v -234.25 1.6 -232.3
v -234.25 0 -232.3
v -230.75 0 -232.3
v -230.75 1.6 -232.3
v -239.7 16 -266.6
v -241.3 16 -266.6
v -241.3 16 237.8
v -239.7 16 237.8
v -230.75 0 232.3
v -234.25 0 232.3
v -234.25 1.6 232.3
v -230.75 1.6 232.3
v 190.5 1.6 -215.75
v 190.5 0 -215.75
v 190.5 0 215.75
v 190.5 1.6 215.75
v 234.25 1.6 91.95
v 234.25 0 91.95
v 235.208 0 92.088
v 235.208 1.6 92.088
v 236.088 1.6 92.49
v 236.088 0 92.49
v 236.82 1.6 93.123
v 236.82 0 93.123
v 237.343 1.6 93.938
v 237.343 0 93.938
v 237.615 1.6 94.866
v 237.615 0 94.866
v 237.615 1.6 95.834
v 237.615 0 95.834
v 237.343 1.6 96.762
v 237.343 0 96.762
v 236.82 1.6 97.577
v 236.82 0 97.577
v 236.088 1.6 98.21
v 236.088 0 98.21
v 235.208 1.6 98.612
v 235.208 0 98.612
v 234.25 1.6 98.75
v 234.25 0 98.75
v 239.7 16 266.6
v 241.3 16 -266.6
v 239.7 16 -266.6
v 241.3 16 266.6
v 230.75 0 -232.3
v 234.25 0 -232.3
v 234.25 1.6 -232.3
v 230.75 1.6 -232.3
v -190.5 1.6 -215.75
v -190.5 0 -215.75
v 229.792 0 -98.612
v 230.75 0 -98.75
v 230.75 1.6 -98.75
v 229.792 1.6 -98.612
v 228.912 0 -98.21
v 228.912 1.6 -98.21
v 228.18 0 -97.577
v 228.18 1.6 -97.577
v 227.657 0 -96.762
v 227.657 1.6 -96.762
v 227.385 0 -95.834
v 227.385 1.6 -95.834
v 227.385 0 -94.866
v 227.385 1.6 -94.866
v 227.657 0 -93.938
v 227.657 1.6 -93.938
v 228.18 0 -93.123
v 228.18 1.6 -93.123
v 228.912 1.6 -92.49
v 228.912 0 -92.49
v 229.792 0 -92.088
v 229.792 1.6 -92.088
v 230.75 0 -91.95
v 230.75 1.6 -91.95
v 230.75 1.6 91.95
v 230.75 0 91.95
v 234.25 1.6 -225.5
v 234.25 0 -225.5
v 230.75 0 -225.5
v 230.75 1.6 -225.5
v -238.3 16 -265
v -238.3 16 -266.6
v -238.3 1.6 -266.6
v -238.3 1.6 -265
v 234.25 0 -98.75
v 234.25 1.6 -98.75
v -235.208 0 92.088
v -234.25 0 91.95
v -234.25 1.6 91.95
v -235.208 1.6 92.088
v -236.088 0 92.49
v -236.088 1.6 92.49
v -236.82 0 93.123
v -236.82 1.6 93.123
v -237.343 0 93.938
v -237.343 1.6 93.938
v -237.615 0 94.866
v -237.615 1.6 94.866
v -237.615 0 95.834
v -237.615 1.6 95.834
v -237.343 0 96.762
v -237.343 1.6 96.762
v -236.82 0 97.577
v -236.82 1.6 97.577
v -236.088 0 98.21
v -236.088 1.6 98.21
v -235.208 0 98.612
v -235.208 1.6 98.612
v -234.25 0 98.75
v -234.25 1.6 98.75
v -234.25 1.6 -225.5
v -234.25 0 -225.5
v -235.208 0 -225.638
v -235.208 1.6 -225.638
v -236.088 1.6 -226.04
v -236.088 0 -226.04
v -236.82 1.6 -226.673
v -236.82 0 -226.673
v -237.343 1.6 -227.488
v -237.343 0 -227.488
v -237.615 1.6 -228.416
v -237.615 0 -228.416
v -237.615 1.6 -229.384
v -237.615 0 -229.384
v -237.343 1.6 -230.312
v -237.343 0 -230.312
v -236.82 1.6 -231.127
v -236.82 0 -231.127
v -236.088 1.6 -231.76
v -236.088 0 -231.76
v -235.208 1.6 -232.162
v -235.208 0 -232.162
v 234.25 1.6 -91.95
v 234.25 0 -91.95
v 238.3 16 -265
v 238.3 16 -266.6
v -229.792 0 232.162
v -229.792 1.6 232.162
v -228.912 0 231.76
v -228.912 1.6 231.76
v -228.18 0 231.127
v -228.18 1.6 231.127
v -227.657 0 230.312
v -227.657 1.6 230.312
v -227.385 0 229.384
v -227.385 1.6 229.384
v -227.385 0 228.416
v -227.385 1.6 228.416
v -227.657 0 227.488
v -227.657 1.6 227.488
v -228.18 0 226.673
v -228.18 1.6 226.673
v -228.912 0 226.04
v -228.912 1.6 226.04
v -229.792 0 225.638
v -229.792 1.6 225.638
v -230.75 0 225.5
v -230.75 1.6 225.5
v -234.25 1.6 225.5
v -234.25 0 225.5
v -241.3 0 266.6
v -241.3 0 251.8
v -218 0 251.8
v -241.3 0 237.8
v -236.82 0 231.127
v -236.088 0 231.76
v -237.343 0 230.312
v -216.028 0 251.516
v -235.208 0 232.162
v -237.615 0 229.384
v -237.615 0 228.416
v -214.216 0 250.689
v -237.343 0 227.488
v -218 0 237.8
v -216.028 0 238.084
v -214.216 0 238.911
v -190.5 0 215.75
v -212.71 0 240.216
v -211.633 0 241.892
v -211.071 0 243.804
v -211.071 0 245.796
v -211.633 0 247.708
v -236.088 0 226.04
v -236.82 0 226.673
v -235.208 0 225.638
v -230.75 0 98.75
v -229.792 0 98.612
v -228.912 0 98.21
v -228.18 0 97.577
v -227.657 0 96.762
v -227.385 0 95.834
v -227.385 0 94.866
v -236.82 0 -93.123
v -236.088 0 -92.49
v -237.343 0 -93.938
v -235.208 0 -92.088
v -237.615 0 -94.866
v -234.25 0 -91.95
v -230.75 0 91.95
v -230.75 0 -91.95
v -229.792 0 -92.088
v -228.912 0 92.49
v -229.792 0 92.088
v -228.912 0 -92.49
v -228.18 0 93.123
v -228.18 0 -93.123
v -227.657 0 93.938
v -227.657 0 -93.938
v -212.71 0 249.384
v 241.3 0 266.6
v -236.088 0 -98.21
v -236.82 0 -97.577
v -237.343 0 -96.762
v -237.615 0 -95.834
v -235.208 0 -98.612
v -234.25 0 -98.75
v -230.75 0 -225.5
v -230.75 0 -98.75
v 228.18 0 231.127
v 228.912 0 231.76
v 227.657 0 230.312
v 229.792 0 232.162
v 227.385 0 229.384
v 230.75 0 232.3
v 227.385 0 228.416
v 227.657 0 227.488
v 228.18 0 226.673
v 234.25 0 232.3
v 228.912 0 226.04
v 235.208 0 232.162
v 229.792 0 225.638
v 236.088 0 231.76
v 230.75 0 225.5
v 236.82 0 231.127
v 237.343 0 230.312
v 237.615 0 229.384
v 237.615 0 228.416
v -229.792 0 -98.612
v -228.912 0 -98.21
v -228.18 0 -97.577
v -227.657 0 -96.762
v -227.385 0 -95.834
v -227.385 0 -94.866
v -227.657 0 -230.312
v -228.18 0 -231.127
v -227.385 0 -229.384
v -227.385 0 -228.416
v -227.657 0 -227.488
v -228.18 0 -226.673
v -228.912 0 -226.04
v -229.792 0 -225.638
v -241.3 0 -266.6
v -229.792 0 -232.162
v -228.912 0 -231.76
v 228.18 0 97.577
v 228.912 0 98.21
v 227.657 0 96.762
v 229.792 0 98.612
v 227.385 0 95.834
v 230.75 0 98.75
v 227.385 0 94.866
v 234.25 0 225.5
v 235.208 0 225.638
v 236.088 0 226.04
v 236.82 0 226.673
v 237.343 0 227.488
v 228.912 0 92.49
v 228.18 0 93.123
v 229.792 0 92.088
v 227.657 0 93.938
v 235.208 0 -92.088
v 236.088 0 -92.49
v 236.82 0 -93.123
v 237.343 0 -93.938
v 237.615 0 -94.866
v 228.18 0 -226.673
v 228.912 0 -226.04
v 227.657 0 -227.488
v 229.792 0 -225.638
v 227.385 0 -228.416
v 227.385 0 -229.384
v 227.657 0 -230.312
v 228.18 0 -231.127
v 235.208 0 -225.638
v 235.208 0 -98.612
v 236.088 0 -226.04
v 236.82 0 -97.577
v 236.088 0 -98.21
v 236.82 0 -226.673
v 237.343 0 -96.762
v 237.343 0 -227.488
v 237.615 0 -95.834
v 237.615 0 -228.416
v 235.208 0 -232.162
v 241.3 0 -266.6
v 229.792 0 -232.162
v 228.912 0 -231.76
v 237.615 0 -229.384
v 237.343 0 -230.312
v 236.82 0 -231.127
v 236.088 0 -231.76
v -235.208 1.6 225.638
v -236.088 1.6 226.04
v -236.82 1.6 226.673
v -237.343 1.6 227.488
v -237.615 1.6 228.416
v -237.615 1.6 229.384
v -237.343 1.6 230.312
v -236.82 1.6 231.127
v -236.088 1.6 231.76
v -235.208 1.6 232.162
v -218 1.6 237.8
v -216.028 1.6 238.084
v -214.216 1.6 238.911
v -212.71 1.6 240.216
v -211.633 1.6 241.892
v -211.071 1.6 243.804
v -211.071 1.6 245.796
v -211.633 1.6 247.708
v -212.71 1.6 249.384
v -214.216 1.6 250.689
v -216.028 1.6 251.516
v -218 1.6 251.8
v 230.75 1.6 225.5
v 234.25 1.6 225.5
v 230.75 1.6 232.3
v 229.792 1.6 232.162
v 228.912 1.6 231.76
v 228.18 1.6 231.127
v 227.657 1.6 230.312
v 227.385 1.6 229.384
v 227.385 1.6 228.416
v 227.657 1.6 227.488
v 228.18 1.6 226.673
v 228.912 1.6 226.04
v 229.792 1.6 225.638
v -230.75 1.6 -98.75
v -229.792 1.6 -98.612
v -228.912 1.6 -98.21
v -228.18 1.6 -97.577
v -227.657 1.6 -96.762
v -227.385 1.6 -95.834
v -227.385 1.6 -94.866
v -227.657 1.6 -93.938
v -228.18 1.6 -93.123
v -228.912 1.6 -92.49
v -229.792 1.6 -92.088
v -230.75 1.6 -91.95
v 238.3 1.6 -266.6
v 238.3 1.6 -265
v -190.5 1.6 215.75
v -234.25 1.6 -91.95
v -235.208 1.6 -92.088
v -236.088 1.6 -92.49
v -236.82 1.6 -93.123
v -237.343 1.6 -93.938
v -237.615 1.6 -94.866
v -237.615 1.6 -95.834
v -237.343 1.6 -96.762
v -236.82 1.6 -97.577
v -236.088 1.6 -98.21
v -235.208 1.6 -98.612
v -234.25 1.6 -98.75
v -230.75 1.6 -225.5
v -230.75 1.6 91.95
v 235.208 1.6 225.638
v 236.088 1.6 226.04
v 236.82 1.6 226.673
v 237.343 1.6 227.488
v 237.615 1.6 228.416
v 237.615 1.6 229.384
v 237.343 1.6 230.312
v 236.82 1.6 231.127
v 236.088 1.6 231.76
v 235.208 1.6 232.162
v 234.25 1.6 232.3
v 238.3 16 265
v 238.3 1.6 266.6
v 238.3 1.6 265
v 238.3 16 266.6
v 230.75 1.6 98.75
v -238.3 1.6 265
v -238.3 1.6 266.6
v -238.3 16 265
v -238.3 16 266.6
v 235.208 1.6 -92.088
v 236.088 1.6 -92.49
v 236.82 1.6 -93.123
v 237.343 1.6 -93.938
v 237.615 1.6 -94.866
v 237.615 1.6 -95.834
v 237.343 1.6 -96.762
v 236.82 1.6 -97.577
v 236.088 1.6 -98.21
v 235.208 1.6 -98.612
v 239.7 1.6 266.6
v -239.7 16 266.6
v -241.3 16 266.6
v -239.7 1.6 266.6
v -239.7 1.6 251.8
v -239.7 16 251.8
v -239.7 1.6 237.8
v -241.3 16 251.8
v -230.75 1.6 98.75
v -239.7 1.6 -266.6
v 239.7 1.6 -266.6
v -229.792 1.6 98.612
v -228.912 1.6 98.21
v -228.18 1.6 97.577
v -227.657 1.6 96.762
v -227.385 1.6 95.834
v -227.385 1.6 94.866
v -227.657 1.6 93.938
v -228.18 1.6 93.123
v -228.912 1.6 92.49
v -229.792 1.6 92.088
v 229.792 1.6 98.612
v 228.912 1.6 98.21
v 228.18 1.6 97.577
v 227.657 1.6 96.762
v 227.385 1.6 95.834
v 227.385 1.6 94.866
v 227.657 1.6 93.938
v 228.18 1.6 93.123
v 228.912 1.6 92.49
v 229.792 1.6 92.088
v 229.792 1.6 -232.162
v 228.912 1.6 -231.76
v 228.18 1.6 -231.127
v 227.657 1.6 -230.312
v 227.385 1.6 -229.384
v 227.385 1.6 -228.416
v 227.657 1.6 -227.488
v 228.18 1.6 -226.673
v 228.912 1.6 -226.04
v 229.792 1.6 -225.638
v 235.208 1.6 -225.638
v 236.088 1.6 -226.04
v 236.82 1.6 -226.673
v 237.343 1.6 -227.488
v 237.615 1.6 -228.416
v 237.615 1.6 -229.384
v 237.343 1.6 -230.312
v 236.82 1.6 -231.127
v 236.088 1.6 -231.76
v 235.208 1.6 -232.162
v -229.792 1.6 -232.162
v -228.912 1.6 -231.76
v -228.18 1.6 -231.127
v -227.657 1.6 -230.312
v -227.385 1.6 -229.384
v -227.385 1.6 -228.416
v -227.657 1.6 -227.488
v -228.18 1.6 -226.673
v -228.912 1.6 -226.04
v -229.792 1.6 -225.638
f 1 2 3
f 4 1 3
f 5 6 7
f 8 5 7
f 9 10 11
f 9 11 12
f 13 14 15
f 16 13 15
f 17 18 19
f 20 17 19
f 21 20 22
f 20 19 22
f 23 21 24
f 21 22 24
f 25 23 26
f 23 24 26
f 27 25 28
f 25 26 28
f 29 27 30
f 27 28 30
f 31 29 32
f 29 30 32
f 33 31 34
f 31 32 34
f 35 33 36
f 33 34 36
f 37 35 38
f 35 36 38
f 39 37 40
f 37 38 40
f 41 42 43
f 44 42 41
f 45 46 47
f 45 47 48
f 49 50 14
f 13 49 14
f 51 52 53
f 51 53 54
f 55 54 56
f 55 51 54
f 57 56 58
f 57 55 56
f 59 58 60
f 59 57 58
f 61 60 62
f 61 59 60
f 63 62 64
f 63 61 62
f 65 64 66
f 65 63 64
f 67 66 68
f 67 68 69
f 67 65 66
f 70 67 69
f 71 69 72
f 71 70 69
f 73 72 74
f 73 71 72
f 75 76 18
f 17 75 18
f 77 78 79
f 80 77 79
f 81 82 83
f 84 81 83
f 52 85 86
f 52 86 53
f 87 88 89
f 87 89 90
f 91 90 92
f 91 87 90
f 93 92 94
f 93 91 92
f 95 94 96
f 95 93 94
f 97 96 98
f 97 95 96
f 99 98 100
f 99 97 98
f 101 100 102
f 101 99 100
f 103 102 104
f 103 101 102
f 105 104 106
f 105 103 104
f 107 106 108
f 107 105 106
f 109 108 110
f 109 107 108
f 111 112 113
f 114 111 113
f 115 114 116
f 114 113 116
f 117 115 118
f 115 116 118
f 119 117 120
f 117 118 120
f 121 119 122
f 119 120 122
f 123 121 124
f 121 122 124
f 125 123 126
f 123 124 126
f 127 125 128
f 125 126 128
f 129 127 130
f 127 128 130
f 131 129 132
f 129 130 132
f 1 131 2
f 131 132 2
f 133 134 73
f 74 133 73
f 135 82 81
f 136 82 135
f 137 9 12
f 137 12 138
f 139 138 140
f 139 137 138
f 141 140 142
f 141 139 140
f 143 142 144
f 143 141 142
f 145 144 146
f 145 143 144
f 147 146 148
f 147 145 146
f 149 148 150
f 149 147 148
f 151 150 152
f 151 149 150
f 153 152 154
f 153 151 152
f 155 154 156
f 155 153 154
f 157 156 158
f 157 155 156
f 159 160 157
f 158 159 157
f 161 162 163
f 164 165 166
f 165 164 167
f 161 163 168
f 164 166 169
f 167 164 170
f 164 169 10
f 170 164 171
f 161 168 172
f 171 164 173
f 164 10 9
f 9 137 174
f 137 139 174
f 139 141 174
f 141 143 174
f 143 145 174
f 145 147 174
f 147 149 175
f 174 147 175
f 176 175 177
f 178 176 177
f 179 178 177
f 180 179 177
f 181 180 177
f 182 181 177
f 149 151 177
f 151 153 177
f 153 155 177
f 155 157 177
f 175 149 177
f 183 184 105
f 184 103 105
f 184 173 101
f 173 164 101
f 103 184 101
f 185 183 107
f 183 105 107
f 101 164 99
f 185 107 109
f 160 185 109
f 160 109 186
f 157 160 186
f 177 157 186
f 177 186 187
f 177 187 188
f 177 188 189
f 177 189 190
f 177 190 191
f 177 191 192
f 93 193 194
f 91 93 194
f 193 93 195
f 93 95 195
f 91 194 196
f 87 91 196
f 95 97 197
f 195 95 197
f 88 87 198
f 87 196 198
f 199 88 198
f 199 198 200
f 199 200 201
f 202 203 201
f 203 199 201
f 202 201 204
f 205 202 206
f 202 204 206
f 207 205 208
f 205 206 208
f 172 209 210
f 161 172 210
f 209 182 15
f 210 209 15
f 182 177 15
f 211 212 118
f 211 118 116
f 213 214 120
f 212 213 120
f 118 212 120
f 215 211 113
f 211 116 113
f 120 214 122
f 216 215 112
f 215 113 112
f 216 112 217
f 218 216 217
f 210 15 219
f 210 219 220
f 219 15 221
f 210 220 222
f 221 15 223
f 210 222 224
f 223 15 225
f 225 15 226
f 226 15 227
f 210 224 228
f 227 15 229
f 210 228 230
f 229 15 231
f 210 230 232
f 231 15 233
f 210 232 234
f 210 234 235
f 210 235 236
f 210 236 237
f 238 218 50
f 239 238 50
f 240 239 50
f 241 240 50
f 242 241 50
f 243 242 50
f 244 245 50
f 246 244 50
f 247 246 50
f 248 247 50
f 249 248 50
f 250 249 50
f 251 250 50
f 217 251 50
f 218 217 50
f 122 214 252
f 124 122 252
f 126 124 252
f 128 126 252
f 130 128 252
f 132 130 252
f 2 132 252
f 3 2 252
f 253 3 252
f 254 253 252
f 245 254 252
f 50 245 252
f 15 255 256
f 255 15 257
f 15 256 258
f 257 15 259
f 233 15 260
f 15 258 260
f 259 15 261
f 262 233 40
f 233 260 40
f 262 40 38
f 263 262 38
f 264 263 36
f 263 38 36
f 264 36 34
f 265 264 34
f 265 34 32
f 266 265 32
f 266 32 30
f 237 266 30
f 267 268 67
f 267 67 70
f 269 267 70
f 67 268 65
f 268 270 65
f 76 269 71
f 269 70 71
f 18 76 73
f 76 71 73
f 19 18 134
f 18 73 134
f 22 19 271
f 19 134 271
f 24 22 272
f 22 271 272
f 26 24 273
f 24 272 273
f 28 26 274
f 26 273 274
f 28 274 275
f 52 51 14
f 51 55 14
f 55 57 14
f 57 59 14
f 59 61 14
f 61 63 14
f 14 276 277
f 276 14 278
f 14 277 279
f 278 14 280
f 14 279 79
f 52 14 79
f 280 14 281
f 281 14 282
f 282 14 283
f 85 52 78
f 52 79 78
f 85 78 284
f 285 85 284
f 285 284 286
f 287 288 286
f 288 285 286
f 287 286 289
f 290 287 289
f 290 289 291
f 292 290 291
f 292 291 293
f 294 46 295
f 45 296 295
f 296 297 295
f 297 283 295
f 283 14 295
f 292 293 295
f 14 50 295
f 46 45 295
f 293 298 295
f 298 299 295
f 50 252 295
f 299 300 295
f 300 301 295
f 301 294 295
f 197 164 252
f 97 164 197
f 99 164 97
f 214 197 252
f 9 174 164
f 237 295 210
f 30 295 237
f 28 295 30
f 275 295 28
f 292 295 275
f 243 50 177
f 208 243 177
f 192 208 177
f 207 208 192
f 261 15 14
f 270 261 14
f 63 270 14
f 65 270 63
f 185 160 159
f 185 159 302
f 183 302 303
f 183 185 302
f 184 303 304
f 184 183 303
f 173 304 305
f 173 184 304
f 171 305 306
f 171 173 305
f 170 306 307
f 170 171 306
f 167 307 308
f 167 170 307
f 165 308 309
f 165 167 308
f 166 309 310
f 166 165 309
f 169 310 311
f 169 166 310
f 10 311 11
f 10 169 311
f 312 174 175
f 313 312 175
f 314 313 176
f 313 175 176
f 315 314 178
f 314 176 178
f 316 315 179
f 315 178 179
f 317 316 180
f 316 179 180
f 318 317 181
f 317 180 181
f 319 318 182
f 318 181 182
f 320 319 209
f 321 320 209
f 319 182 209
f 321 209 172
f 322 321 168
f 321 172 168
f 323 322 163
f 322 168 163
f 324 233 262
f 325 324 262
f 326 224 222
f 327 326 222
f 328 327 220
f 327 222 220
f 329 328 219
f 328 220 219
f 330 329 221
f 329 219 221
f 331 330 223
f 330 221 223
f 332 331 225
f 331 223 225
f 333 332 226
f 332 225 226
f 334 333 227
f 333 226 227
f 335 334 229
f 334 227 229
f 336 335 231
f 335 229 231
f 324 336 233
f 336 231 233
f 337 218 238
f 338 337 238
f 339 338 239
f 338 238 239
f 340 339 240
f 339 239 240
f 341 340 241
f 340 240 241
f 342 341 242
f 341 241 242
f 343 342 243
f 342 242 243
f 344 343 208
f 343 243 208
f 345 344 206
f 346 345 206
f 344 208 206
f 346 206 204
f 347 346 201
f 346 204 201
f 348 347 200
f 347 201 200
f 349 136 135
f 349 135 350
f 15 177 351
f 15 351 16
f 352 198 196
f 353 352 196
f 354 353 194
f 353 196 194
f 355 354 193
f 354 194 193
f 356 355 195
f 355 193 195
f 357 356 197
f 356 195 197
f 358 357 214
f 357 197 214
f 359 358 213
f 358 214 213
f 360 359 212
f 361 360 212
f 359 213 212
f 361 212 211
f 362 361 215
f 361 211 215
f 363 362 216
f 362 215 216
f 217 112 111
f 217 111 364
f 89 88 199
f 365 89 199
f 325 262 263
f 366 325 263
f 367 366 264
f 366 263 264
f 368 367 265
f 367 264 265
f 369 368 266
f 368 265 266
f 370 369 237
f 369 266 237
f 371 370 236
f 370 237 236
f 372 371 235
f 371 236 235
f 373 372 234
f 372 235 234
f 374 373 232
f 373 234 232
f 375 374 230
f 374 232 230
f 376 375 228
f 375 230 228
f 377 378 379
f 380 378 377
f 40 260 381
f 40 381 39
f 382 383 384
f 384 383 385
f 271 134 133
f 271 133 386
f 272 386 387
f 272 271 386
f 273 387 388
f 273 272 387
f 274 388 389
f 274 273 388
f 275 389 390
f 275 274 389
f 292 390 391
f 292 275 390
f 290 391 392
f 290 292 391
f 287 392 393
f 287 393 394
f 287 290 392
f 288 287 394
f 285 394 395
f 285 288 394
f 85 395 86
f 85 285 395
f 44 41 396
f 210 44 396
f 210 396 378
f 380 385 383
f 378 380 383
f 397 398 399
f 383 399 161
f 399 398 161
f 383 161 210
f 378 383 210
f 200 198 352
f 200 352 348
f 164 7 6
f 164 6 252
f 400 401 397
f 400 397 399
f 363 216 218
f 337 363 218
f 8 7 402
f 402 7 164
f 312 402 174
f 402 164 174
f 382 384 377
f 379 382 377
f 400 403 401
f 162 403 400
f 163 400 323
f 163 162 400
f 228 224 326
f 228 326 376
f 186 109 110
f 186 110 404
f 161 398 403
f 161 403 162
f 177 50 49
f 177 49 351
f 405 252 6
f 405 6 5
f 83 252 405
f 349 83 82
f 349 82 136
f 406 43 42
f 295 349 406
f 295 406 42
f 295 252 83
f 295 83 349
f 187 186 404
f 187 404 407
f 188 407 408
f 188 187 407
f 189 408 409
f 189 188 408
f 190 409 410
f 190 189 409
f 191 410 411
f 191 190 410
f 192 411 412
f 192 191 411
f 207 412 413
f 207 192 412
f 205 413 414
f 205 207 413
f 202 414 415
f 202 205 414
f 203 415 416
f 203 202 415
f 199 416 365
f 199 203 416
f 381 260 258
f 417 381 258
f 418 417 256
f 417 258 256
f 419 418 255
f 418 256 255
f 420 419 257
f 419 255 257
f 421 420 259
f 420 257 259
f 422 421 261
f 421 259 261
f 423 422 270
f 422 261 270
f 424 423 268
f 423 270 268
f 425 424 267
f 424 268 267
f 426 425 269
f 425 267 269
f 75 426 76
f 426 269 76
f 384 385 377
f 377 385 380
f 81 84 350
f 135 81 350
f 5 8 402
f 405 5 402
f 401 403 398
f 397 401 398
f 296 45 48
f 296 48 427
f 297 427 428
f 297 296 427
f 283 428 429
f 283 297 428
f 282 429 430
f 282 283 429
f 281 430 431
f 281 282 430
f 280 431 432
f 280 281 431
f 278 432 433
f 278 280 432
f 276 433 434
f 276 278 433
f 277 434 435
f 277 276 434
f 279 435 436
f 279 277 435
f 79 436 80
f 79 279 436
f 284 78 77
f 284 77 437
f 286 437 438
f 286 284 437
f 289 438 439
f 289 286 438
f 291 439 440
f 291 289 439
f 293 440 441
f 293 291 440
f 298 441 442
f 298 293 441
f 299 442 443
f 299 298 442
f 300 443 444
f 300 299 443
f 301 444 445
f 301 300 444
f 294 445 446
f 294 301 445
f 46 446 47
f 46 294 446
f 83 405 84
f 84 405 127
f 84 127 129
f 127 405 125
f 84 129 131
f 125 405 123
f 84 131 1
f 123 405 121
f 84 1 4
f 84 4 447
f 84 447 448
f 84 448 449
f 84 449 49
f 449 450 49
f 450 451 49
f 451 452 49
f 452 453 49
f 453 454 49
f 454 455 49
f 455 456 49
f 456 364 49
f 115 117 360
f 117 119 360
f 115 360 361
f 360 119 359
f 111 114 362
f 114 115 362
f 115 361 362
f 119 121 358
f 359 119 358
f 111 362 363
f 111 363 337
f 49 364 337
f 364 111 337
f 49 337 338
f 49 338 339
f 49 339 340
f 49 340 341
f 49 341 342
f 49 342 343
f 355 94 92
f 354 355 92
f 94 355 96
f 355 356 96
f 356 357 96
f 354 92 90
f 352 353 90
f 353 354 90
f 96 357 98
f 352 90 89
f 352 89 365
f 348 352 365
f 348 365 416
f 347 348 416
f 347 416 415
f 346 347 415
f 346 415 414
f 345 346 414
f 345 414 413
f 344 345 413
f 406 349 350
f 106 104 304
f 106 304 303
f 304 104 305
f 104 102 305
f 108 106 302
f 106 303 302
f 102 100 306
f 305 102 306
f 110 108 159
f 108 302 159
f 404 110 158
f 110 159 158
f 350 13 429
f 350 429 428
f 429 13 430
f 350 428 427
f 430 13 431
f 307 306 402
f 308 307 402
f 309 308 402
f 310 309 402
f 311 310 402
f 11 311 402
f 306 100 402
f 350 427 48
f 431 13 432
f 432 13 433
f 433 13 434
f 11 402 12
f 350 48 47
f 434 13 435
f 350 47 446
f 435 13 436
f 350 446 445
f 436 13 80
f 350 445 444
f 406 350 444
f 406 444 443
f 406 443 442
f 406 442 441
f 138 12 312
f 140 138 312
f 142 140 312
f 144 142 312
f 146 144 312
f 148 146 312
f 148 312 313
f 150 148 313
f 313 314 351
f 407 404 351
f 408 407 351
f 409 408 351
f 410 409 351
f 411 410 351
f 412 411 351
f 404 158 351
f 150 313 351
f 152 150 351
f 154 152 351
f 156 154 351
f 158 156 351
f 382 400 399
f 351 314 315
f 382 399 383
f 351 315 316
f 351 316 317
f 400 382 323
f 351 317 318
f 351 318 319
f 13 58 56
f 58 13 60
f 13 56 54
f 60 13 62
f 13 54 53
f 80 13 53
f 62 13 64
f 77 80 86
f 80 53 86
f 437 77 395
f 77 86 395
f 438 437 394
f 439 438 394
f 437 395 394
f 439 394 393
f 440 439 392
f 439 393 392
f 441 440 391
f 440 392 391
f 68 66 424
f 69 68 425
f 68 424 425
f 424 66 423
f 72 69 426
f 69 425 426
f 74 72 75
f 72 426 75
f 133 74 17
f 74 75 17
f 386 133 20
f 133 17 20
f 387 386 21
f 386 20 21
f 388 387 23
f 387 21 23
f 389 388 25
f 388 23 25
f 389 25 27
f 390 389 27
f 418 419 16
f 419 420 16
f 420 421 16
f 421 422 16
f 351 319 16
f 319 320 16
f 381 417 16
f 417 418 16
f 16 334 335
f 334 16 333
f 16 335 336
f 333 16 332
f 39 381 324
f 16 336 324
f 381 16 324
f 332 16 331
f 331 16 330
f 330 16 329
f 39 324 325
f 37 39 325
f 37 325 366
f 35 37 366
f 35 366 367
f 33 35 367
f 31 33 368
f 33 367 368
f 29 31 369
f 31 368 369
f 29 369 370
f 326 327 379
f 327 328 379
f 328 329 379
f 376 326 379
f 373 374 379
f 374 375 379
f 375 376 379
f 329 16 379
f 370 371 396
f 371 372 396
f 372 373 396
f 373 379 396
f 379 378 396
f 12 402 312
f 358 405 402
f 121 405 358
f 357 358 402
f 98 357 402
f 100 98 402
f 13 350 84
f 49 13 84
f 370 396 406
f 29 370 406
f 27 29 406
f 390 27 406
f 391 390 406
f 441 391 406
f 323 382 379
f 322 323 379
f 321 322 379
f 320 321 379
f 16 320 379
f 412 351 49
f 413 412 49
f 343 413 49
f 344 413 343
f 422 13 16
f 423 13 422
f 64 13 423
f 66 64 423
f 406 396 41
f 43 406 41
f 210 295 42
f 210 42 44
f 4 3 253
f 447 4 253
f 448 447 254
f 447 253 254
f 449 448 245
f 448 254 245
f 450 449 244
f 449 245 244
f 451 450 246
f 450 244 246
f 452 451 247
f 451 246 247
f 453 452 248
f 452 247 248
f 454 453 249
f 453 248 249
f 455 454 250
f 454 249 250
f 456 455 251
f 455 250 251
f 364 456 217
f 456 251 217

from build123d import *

# Parameters (mm, degrees)
F0_W              = 482.6
F0_H              = 533.2
F1_DEPTH          = 1.6
F2_W              = 16
F2_H              = 533.2
F3_DEPTH          = 1.6
F4_W              = 16
F4_H              = 533.2
F5_DEPTH          = 1.6
F6_W              = 476.6
F6_H              = 16
F7_DEPTH          = 1.6
F8_W              = 476.6
F8_H              = 16
F9_DEPTH          = 1.6
F10_W             = 381
F10_H             = 431.5
F11_DEPTH         = 1.6
F12_W             = 3.5
F12_H             = 6.8
F13_DEPTH         = 1.6
F13_COPIES3_COUNT = 2
F13_COPIES3_PITCH = 652.537999
F13_COPIES4_COUNT = 2
F13_COPIES4_PITCH = 566.888933
F14_W             = 3.5
F14_H             = 6.8
F15_DEPTH         = 1.6
F16_W             = 23.3
F16_H             = 14
F17_DEPTH         = 16


# Not quite as in the source:
# - a pattern or mirror of a feature is missing from the dataset's text; its kind, count and spacing are read off the source's solid


with BuildPart() as f1:
    # F0 (on Front) → F1 (new body)
    with BuildSketch(Plane.XZ):
        Rectangle(F0_W, F0_H)
    extrude(amount=-F1_DEPTH)

    # F2 (on face) → F3 (join)
    with BuildSketch(Plane(origin=(-241.3, 0, 0), x_dir=(0, -1, 0), z_dir=(-1, 0, 0))):
        with Locations((-8, 0)):
            Rectangle(F2_W, F2_H)
    extrude(amount=-F3_DEPTH)

    # F4 (on face) → F5 (join)
    with BuildSketch(Plane.YZ.offset(241.3)):
        with Locations((8, 0)):
            Rectangle(F4_W, F4_H)
    extrude(amount=-F5_DEPTH)

    # F6 (on face) → F7 (join)
    with BuildSketch(Plane.XY.offset(266.6)):
        with Locations((0, 8)):
            Rectangle(F6_W, F6_H)
    extrude(amount=-F7_DEPTH)

    # F8 (on face) → F9 (join)
    with BuildSketch(Plane(origin=(0, 0, -266.6), x_dir=(1, 0, 0), z_dir=(0, 0, -1))):
        with Locations((0, -8)):
            Rectangle(F8_W, F8_H)
    extrude(amount=-F9_DEPTH)

    # F10 (on face) → F11 (cut)
    with BuildSketch(Plane.XZ):
        Rectangle(F10_W, F10_H)
    extrude(amount=-F11_DEPTH, mode=Mode.SUBTRACT)

    # F12 (on face) → F13 (cut)
    with BuildSketch(Plane.XZ):
        with Locations((-232.5, -228.9)):
            Rectangle(F12_W, F12_H)
        with BuildLine():
            Line((-230.75, -225.5), (-230.75, -232.3))
            ThreePointArc((-230.75, -232.3), (-227.35, -228.9), (-230.75, -225.5))
        make_face()
        with BuildLine():
            ThreePointArc((-234.25, -225.5), (-237.65, -228.9), (-234.25, -232.3))
            Line((-234.25, -232.3), (-234.25, -225.5))
        make_face()
    f13 = extrude(amount=-F13_DEPTH, mode=Mode.SUBTRACT)

    # F13_copies: F13 across plane
    add(f13.mirror(Plane.XY), mode=Mode.SUBTRACT)

    # F13_copies1: F13 across plane
    add(f13.mirror(Plane.XY.offset(-66.775)), mode=Mode.SUBTRACT)

    # F13_copies2: F13 across plane
    add(f13.mirror(Plane(origin=(0, 0, 0), x_dir=(0, 0, 1), z_dir=(1, 0, 0))), mode=Mode.SUBTRACT)

    # F13_copies3: F13 ×2
    with Locations(*[Vector(0.7126021792, 0, 0.701568339) * (i * F13_COPIES3_PITCH) for i in range(1, F13_COPIES3_COUNT)]):
        add(f13, mode=Mode.SUBTRACT)

    # F13_copies4: F13 ×2
    with Locations(*[Vector(0.8202664981, 0, 0.5719815312) * (i * F13_COPIES4_PITCH) for i in range(1, F13_COPIES4_COUNT)]):
        add(f13, mode=Mode.SUBTRACT)

    # F14 (on face) → F15 (cut)
    with BuildSketch(Plane.XZ):
        with Locations((-232.5, -95.35)):
            Rectangle(F14_W, F14_H)
        with BuildLine():
            Line((-230.75, -91.95), (-230.75, -98.75))
            ThreePointArc((-230.75, -98.75), (-227.35, -95.35), (-230.75, -91.95))
        make_face()
        with BuildLine():
            ThreePointArc((-234.25, -91.95), (-237.65, -95.35), (-234.25, -98.75))
            Line((-234.25, -98.75), (-234.25, -91.95))
        make_face()
    f15 = extrude(amount=-F15_DEPTH, mode=Mode.SUBTRACT)

    # F15_copies: F15 across plane
    add(f15.mirror(Plane(origin=(0, 0, 0), x_dir=(0, 0, 1), z_dir=(1, 0, 0))), mode=Mode.SUBTRACT)

    # F16 (on face) → F17 (cut)
    with BuildSketch(Plane.XZ):
        with Locations((-229.65, 244.8)):
            Rectangle(F16_W, F16_H)
        with BuildLine():
            Line((-218, 251.8), (-218, 237.8))
            ThreePointArc((-218, 237.8), (-211, 244.8), (-218, 251.8))
        make_face()
    extrude(amount=-F17_DEPTH, mode=Mode.SUBTRACT)


solid = f1.part
